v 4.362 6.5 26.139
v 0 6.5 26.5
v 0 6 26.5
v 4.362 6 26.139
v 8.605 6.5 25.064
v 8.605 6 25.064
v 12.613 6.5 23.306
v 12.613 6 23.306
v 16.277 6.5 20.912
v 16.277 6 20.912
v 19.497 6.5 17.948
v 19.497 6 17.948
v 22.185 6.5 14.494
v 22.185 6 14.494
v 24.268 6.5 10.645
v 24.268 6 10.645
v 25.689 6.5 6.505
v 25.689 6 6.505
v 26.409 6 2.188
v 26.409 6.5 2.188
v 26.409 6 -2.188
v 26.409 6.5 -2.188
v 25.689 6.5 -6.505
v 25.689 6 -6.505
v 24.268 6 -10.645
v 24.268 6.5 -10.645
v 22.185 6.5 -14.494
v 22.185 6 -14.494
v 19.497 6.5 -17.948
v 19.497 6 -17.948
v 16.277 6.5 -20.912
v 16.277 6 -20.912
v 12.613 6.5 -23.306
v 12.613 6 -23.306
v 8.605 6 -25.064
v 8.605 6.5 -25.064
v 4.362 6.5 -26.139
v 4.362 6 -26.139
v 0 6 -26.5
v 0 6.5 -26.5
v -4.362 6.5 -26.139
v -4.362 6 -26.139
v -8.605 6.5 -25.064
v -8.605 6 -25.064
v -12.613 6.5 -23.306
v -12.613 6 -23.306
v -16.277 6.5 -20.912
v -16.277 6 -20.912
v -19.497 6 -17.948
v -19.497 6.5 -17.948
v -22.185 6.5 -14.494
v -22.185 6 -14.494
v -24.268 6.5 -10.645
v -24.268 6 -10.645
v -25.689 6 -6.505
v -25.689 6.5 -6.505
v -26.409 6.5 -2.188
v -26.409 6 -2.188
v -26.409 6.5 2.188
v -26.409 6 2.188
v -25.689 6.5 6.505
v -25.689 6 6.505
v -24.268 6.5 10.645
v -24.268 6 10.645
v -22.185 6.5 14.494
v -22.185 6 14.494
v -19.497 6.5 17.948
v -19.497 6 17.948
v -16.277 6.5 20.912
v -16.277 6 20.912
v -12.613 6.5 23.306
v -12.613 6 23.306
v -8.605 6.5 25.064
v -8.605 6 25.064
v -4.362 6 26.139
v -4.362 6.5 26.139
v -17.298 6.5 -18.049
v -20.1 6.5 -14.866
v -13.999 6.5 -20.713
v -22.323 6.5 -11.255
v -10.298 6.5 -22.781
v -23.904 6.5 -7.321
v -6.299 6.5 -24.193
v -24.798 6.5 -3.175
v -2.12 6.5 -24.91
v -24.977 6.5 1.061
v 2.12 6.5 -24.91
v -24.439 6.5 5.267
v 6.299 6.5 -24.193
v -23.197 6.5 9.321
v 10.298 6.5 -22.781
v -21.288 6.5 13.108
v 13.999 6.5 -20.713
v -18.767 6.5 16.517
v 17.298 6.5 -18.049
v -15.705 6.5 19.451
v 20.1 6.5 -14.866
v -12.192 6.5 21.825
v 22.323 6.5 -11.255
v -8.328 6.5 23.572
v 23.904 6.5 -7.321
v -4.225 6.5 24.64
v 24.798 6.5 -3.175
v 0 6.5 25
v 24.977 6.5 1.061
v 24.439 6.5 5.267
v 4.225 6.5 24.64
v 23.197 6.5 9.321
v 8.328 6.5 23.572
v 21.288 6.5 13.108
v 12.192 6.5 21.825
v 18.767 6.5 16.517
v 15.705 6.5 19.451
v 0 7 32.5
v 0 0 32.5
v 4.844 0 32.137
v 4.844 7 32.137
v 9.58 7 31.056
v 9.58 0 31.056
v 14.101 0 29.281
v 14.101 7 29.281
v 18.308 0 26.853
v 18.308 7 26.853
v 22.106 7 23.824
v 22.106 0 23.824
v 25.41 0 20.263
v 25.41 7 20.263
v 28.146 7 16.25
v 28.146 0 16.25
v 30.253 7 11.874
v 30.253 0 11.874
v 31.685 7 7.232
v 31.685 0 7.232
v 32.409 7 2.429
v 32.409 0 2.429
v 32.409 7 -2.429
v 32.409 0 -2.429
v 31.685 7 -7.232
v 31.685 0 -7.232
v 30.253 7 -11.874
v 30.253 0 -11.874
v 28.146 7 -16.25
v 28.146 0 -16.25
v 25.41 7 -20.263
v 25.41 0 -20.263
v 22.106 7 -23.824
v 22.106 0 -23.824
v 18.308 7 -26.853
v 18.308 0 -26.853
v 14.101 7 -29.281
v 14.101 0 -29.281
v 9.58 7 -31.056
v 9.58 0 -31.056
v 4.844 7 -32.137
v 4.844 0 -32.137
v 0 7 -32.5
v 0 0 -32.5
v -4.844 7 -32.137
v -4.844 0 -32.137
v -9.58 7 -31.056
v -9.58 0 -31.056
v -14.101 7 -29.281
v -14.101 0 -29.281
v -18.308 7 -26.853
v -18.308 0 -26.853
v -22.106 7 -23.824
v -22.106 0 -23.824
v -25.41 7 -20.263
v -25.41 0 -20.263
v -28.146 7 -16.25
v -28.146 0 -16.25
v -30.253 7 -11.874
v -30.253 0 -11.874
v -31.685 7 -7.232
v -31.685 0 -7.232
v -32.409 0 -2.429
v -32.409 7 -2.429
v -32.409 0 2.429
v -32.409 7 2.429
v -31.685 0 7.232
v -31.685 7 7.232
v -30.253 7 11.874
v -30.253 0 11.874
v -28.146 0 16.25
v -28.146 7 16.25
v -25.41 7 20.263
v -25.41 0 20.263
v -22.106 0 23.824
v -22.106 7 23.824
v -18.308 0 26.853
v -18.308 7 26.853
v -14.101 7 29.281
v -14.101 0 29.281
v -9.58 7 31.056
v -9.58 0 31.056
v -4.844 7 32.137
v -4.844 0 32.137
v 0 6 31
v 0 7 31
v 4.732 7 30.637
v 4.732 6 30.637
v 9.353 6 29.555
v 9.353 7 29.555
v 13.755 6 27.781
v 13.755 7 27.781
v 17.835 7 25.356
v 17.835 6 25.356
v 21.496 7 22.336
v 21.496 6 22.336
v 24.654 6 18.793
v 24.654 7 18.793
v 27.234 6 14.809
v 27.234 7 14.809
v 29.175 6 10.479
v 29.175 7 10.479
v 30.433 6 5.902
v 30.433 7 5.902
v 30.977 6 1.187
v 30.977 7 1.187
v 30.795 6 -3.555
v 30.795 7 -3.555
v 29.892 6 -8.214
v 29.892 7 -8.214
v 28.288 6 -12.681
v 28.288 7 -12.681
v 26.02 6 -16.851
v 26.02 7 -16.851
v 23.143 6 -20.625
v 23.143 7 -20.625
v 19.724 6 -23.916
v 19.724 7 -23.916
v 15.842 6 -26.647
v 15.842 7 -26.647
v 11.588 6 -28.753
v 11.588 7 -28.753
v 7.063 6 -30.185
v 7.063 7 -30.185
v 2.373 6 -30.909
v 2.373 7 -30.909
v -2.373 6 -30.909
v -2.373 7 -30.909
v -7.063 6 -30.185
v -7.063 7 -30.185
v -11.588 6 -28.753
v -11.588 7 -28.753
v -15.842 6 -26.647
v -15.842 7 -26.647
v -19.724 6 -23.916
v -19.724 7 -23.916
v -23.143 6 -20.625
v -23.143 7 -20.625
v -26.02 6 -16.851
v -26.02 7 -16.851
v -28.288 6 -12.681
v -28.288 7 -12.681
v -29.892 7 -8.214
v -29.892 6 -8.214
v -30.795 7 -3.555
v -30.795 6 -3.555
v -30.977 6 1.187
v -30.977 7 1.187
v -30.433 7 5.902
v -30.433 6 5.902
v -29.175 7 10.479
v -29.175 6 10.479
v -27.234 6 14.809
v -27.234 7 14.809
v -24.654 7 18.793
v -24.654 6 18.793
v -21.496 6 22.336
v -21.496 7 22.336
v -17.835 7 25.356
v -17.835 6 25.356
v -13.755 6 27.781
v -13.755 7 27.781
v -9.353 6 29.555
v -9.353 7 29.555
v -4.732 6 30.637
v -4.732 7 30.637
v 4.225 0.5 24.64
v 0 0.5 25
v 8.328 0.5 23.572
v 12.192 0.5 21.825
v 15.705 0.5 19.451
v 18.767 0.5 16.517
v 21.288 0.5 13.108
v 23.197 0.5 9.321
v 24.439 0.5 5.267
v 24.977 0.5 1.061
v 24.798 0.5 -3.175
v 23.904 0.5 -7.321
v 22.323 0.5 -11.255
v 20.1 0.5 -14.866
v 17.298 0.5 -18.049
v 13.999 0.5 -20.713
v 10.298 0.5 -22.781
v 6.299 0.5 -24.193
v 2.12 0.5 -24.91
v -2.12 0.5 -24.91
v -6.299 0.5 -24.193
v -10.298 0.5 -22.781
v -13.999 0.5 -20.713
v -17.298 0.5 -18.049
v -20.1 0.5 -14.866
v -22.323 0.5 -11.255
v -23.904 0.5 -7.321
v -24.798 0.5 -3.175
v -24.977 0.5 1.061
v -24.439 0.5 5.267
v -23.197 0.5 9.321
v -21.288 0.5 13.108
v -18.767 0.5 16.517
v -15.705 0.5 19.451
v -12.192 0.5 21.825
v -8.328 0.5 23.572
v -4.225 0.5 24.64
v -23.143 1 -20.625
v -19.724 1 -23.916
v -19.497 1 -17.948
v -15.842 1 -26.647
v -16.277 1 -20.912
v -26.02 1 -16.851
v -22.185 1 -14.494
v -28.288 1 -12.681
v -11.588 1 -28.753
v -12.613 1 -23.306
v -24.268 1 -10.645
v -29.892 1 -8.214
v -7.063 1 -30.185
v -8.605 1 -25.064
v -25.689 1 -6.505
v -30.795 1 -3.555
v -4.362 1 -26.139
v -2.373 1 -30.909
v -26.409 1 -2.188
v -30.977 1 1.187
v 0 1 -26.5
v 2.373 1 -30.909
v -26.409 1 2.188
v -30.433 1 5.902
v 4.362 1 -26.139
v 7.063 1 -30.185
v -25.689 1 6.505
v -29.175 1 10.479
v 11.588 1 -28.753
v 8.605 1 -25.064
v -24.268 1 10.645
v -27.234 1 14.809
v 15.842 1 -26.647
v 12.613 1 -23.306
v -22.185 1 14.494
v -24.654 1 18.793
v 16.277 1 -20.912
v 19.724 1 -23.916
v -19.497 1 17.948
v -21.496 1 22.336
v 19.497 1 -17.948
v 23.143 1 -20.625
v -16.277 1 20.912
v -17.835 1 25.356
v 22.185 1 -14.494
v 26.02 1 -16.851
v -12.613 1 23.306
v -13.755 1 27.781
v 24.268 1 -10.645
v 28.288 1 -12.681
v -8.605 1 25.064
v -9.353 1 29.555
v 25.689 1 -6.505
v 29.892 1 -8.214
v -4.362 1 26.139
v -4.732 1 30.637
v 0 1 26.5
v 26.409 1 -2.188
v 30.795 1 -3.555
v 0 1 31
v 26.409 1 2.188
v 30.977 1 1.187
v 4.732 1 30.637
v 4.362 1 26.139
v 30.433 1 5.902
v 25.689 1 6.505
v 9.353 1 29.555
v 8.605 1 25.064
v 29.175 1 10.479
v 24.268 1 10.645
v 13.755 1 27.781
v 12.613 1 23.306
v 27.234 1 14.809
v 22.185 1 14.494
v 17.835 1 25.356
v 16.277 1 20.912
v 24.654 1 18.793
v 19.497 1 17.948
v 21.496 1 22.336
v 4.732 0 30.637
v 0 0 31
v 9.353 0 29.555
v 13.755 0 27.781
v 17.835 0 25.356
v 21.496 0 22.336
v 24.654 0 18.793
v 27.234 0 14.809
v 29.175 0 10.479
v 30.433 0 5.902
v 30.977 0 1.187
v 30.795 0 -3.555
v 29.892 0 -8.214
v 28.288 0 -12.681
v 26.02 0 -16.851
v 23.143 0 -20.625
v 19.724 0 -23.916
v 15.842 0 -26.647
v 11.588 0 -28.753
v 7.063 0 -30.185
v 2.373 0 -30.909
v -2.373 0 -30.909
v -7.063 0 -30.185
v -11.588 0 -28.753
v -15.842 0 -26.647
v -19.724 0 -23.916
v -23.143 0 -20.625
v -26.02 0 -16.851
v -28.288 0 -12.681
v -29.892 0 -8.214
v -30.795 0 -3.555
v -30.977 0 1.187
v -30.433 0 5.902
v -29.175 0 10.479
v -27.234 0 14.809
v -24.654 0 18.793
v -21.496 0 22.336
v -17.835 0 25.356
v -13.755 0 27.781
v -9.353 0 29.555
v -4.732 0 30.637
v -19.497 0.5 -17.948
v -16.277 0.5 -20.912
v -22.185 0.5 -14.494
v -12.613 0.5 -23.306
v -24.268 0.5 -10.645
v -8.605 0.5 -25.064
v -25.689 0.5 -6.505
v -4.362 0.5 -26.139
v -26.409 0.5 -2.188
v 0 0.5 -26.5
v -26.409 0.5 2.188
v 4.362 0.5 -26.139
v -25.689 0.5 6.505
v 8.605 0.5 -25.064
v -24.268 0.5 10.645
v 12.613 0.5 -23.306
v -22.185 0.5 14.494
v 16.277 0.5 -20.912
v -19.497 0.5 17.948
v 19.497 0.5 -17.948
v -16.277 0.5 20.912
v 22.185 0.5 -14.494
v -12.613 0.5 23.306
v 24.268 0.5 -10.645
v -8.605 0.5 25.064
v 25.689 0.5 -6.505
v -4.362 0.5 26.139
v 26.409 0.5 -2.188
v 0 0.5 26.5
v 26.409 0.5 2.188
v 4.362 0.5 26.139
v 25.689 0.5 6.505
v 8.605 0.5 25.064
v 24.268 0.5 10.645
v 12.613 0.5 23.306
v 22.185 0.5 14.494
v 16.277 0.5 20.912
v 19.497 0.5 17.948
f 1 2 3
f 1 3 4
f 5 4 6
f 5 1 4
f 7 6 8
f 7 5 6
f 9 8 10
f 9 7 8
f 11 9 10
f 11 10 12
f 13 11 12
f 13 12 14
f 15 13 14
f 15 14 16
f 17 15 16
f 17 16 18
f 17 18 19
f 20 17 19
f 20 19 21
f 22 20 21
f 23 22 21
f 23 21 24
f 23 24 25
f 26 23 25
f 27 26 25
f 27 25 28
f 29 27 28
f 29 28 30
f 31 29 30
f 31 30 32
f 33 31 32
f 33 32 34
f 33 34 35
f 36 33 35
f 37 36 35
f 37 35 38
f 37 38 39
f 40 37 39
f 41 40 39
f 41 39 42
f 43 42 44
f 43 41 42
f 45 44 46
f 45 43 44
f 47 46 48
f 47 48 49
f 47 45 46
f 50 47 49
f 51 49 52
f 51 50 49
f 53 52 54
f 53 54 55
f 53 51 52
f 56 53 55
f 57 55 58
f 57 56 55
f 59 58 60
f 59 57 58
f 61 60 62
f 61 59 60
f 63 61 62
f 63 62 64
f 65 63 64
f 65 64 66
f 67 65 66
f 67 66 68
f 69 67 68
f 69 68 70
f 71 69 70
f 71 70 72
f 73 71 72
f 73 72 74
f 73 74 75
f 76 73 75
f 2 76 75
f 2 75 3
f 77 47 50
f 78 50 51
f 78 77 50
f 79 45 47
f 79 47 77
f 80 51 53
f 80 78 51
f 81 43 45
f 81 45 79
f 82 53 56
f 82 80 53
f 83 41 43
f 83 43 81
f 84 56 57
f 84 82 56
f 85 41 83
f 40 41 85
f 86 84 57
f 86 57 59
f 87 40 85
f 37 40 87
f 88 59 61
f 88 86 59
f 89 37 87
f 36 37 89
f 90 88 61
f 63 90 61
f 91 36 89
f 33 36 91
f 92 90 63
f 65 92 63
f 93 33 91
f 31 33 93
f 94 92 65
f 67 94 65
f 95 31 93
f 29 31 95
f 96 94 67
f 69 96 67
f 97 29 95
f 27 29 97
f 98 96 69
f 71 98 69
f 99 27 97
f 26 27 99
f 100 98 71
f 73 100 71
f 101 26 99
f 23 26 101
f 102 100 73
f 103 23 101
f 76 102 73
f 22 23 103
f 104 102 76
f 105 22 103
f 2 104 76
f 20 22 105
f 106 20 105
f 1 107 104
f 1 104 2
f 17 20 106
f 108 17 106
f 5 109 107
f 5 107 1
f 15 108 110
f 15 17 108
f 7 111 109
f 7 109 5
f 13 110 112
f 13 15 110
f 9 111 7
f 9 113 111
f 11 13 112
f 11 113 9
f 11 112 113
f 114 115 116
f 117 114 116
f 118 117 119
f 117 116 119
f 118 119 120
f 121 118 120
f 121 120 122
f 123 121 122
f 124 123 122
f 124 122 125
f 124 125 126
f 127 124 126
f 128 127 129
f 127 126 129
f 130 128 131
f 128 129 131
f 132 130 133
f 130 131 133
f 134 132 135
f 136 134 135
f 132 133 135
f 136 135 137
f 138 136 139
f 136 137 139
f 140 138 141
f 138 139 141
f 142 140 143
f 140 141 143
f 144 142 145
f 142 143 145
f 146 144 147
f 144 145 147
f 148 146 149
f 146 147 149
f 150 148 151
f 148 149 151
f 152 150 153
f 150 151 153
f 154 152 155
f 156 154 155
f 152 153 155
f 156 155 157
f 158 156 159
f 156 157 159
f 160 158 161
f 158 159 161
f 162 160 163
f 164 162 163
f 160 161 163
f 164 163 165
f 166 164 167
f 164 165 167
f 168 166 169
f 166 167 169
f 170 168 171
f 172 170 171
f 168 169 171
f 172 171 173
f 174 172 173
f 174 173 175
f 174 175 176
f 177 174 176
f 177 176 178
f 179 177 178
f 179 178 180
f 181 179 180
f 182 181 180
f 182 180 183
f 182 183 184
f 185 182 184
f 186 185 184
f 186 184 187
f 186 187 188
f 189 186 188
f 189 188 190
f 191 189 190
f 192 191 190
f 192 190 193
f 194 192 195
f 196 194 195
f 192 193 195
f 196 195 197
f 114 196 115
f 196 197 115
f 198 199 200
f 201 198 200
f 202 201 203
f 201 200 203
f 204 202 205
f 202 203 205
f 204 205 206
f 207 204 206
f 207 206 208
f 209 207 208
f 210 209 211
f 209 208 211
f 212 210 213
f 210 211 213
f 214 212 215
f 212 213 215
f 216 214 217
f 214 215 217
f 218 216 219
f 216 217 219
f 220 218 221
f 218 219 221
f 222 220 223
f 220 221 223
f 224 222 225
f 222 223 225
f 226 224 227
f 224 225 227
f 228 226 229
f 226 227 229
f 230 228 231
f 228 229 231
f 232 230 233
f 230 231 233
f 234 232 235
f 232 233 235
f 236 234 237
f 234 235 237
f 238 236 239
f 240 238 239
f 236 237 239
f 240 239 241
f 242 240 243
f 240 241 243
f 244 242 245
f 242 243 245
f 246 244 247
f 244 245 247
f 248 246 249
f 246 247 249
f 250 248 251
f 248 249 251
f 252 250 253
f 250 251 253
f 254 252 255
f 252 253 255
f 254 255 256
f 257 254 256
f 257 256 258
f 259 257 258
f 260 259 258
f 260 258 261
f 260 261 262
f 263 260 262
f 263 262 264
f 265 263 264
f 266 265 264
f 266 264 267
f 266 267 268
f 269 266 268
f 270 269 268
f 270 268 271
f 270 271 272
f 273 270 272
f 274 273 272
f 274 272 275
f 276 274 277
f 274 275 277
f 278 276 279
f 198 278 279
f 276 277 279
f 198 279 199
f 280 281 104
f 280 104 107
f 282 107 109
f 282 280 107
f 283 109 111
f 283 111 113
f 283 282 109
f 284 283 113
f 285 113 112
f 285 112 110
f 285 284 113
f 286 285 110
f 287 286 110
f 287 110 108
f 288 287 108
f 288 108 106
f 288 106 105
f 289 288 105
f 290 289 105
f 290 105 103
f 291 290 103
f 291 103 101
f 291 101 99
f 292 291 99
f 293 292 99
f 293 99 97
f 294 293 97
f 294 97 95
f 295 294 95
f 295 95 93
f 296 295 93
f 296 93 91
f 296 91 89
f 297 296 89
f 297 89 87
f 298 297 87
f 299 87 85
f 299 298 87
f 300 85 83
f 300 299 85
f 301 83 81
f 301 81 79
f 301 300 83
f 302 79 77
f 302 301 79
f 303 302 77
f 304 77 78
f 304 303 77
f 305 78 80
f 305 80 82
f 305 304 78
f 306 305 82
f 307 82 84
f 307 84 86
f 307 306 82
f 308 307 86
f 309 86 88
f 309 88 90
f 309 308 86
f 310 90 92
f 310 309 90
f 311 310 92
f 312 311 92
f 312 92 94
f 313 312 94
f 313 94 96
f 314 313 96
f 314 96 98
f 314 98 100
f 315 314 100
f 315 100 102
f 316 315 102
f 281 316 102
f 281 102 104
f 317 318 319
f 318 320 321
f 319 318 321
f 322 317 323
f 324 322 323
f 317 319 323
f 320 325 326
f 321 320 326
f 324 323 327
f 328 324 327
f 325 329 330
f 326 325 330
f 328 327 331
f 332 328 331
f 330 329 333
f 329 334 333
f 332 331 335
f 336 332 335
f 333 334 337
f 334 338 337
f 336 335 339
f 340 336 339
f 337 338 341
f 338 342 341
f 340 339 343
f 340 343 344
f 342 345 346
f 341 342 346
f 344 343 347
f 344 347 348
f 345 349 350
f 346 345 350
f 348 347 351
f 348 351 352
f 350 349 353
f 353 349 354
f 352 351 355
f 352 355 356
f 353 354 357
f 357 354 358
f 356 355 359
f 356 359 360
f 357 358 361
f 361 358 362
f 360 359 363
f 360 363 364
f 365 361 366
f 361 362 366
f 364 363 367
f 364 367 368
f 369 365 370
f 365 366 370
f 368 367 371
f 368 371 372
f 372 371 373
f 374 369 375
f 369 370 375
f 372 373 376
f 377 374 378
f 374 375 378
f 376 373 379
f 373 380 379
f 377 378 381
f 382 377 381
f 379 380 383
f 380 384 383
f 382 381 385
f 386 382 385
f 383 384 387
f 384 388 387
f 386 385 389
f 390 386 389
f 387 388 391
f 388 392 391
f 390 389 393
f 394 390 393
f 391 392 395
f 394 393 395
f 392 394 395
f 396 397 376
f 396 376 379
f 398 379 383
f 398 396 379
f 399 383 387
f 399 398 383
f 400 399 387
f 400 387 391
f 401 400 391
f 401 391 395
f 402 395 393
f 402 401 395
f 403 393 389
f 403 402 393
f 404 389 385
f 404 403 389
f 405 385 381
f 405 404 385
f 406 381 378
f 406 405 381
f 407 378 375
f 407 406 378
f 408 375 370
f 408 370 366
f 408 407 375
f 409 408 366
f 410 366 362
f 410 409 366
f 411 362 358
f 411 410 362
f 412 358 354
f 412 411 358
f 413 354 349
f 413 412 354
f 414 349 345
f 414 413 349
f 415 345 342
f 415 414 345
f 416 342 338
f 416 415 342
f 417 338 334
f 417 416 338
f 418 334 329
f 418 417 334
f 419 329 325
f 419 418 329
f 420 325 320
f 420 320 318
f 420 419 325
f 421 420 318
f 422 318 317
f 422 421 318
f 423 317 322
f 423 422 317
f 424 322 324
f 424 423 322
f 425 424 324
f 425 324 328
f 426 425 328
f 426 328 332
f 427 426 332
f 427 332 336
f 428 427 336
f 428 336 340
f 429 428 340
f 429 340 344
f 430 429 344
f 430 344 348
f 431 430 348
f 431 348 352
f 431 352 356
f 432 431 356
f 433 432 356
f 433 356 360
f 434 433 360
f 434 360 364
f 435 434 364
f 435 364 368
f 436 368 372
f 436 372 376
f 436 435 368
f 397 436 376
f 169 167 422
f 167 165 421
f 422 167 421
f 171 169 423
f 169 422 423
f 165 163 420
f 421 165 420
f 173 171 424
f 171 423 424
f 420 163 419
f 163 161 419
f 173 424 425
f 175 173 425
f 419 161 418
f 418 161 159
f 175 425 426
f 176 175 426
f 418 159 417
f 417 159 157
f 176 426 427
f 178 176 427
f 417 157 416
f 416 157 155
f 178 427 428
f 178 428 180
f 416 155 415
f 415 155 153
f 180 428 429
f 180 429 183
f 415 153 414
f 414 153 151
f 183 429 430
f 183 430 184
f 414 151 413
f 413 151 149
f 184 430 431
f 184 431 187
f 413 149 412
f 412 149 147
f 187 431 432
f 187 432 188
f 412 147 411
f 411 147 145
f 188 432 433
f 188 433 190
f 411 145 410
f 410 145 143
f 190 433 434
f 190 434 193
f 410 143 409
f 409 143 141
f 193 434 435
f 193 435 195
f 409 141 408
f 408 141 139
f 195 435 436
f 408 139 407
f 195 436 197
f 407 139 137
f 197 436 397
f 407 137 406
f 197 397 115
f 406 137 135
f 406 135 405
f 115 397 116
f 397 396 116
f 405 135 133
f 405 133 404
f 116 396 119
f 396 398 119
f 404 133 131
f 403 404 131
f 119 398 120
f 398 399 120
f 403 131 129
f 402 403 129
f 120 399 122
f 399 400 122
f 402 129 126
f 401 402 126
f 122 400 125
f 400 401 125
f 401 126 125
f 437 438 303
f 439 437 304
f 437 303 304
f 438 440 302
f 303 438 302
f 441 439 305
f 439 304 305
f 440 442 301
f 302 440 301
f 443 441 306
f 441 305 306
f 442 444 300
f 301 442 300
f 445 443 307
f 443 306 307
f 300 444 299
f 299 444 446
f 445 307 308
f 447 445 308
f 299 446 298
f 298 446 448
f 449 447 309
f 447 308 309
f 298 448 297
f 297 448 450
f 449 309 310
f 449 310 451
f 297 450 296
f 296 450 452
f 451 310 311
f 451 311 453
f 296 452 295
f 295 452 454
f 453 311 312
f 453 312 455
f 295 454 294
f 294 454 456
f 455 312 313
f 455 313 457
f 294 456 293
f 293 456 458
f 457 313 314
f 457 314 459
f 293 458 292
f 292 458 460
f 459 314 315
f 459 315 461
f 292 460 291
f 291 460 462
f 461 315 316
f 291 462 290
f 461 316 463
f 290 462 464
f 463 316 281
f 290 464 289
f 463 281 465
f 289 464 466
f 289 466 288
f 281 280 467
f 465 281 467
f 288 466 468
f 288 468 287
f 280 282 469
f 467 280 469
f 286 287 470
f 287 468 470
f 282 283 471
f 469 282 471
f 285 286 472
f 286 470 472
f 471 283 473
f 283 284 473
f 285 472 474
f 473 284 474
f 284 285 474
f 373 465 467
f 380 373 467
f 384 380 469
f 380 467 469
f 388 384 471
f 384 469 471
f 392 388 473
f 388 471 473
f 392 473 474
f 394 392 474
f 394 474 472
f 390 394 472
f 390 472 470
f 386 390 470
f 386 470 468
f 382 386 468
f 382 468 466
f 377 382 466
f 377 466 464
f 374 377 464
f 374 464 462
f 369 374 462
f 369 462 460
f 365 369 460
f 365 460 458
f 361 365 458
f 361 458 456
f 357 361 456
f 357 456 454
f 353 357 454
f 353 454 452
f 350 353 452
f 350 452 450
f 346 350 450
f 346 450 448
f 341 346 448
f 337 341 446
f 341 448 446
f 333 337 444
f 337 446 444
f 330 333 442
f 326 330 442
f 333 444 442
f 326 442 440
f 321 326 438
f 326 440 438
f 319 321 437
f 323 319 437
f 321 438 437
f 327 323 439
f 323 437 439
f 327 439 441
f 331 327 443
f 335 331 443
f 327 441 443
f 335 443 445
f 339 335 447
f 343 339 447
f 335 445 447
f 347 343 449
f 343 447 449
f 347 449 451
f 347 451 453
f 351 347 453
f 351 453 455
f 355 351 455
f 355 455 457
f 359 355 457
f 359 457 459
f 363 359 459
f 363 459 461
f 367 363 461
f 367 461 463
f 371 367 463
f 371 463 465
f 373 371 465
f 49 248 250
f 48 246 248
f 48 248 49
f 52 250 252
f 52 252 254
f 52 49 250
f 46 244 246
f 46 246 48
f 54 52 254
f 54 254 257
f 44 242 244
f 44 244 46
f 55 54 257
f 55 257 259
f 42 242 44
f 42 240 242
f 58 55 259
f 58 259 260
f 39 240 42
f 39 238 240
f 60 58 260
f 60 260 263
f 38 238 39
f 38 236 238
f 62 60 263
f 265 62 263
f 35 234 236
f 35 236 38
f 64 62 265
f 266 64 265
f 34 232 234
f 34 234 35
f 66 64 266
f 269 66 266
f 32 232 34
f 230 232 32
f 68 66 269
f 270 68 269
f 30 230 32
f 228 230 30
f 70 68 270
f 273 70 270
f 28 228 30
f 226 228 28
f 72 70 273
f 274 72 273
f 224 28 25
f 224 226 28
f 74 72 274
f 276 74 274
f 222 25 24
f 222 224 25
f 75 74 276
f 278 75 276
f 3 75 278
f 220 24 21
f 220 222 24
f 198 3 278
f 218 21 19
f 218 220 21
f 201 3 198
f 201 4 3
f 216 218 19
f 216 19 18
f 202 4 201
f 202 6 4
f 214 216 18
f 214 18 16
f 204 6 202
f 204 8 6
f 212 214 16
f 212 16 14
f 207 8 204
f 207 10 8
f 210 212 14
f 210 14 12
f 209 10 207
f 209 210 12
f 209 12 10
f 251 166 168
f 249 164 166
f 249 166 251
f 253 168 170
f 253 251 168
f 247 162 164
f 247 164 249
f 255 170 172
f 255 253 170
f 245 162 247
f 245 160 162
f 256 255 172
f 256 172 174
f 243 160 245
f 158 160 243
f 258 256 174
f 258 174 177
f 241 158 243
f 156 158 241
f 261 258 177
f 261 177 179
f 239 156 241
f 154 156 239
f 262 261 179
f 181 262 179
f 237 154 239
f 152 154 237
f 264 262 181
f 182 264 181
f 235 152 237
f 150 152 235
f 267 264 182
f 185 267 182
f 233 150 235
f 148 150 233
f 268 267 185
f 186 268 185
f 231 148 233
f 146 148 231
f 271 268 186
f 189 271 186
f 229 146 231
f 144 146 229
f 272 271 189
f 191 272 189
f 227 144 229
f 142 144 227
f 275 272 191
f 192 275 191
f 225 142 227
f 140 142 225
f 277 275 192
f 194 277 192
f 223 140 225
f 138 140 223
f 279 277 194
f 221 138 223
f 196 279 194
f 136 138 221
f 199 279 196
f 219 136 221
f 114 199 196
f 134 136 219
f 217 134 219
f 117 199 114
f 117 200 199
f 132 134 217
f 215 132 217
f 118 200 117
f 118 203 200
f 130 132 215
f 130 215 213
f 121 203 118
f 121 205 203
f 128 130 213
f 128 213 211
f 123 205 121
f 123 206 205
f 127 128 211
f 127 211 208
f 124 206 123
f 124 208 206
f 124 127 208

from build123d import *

# Parameters (mm, degrees)
CROQUIS1_R                 = 32.5
CROQUIS1_R_2               = 25
SALIENTE_EXTRUIR1_DEPTH    = 7
INTERNAL_SEAL_SKETCH_R     = 31
INTERNAL_SEAL_SKETCH_R_2   = 26.5
CORTAR_EXTRUIR1_DEPTH      = 1
INTERNAL_ADJUST_SKETCH_R   = 26.5
INTERNAL_ADJUST_SKETCH_R_2 = 25
CORTAR_EXTRUIR2_DEPTH      = 0.5


with BuildPart() as part:
    # Croquis1 → Saliente-Extruir1 (new body)
    with BuildSketch(Plane(origin=(0, 0, 0), x_dir=(1, 0, 0), z_dir=(0, 1, 0))):
        with Locations(Location((0, 0, 0), (0, 0, 270))):
            Circle(CROQUIS1_R)
        with Locations(Location((0, 0, 0), (0, 0, 270))):
            Circle(CROQUIS1_R_2, mode=Mode.SUBTRACT)
    extrude(amount=SALIENTE_EXTRUIR1_DEPTH)

    # Internal seal sketch → Cortar-Extruir1 (cut)
    with BuildSketch(Plane(origin=(0, 7, 0), x_dir=(1, 0, 0), z_dir=(0, 1, 0))):
        with Locations(Location((0, 0, 0), (0, 0, 270))):
            Circle(INTERNAL_SEAL_SKETCH_R)
        with Locations(Location((0, 0, 0), (0, 0, 270))):
            Circle(INTERNAL_SEAL_SKETCH_R_2, mode=Mode.SUBTRACT)
    cortar_extruir1 = extrude(amount=-CORTAR_EXTRUIR1_DEPTH, mode=Mode.SUBTRACT)

    # Internal adjust sketch → Cortar-Extruir2 (cut)
    with BuildSketch(Plane(origin=(0, 7, 0), x_dir=(1, 0, 0), z_dir=(0, 1, 0))):
        with Locations(Location((0, 0, 0), (0, 0, 270))):
            Circle(INTERNAL_ADJUST_SKETCH_R)
        with Locations(Location((0, 0, 0), (0, 0, 270))):
            Circle(INTERNAL_ADJUST_SKETCH_R_2, mode=Mode.SUBTRACT)
    cortar_extruir2 = extrude(amount=-CORTAR_EXTRUIR2_DEPTH, mode=Mode.SUBTRACT)

    # Simetría1: Cortar-Extruir1, Cortar-Extruir2 across plane
    add(cortar_extruir1.mirror(Plane.ZX.offset(3.5)), mode=Mode.SUBTRACT)
    add(cortar_extruir2.mirror(Plane.ZX.offset(3.5)), mode=Mode.SUBTRACT)


solid = part.part
